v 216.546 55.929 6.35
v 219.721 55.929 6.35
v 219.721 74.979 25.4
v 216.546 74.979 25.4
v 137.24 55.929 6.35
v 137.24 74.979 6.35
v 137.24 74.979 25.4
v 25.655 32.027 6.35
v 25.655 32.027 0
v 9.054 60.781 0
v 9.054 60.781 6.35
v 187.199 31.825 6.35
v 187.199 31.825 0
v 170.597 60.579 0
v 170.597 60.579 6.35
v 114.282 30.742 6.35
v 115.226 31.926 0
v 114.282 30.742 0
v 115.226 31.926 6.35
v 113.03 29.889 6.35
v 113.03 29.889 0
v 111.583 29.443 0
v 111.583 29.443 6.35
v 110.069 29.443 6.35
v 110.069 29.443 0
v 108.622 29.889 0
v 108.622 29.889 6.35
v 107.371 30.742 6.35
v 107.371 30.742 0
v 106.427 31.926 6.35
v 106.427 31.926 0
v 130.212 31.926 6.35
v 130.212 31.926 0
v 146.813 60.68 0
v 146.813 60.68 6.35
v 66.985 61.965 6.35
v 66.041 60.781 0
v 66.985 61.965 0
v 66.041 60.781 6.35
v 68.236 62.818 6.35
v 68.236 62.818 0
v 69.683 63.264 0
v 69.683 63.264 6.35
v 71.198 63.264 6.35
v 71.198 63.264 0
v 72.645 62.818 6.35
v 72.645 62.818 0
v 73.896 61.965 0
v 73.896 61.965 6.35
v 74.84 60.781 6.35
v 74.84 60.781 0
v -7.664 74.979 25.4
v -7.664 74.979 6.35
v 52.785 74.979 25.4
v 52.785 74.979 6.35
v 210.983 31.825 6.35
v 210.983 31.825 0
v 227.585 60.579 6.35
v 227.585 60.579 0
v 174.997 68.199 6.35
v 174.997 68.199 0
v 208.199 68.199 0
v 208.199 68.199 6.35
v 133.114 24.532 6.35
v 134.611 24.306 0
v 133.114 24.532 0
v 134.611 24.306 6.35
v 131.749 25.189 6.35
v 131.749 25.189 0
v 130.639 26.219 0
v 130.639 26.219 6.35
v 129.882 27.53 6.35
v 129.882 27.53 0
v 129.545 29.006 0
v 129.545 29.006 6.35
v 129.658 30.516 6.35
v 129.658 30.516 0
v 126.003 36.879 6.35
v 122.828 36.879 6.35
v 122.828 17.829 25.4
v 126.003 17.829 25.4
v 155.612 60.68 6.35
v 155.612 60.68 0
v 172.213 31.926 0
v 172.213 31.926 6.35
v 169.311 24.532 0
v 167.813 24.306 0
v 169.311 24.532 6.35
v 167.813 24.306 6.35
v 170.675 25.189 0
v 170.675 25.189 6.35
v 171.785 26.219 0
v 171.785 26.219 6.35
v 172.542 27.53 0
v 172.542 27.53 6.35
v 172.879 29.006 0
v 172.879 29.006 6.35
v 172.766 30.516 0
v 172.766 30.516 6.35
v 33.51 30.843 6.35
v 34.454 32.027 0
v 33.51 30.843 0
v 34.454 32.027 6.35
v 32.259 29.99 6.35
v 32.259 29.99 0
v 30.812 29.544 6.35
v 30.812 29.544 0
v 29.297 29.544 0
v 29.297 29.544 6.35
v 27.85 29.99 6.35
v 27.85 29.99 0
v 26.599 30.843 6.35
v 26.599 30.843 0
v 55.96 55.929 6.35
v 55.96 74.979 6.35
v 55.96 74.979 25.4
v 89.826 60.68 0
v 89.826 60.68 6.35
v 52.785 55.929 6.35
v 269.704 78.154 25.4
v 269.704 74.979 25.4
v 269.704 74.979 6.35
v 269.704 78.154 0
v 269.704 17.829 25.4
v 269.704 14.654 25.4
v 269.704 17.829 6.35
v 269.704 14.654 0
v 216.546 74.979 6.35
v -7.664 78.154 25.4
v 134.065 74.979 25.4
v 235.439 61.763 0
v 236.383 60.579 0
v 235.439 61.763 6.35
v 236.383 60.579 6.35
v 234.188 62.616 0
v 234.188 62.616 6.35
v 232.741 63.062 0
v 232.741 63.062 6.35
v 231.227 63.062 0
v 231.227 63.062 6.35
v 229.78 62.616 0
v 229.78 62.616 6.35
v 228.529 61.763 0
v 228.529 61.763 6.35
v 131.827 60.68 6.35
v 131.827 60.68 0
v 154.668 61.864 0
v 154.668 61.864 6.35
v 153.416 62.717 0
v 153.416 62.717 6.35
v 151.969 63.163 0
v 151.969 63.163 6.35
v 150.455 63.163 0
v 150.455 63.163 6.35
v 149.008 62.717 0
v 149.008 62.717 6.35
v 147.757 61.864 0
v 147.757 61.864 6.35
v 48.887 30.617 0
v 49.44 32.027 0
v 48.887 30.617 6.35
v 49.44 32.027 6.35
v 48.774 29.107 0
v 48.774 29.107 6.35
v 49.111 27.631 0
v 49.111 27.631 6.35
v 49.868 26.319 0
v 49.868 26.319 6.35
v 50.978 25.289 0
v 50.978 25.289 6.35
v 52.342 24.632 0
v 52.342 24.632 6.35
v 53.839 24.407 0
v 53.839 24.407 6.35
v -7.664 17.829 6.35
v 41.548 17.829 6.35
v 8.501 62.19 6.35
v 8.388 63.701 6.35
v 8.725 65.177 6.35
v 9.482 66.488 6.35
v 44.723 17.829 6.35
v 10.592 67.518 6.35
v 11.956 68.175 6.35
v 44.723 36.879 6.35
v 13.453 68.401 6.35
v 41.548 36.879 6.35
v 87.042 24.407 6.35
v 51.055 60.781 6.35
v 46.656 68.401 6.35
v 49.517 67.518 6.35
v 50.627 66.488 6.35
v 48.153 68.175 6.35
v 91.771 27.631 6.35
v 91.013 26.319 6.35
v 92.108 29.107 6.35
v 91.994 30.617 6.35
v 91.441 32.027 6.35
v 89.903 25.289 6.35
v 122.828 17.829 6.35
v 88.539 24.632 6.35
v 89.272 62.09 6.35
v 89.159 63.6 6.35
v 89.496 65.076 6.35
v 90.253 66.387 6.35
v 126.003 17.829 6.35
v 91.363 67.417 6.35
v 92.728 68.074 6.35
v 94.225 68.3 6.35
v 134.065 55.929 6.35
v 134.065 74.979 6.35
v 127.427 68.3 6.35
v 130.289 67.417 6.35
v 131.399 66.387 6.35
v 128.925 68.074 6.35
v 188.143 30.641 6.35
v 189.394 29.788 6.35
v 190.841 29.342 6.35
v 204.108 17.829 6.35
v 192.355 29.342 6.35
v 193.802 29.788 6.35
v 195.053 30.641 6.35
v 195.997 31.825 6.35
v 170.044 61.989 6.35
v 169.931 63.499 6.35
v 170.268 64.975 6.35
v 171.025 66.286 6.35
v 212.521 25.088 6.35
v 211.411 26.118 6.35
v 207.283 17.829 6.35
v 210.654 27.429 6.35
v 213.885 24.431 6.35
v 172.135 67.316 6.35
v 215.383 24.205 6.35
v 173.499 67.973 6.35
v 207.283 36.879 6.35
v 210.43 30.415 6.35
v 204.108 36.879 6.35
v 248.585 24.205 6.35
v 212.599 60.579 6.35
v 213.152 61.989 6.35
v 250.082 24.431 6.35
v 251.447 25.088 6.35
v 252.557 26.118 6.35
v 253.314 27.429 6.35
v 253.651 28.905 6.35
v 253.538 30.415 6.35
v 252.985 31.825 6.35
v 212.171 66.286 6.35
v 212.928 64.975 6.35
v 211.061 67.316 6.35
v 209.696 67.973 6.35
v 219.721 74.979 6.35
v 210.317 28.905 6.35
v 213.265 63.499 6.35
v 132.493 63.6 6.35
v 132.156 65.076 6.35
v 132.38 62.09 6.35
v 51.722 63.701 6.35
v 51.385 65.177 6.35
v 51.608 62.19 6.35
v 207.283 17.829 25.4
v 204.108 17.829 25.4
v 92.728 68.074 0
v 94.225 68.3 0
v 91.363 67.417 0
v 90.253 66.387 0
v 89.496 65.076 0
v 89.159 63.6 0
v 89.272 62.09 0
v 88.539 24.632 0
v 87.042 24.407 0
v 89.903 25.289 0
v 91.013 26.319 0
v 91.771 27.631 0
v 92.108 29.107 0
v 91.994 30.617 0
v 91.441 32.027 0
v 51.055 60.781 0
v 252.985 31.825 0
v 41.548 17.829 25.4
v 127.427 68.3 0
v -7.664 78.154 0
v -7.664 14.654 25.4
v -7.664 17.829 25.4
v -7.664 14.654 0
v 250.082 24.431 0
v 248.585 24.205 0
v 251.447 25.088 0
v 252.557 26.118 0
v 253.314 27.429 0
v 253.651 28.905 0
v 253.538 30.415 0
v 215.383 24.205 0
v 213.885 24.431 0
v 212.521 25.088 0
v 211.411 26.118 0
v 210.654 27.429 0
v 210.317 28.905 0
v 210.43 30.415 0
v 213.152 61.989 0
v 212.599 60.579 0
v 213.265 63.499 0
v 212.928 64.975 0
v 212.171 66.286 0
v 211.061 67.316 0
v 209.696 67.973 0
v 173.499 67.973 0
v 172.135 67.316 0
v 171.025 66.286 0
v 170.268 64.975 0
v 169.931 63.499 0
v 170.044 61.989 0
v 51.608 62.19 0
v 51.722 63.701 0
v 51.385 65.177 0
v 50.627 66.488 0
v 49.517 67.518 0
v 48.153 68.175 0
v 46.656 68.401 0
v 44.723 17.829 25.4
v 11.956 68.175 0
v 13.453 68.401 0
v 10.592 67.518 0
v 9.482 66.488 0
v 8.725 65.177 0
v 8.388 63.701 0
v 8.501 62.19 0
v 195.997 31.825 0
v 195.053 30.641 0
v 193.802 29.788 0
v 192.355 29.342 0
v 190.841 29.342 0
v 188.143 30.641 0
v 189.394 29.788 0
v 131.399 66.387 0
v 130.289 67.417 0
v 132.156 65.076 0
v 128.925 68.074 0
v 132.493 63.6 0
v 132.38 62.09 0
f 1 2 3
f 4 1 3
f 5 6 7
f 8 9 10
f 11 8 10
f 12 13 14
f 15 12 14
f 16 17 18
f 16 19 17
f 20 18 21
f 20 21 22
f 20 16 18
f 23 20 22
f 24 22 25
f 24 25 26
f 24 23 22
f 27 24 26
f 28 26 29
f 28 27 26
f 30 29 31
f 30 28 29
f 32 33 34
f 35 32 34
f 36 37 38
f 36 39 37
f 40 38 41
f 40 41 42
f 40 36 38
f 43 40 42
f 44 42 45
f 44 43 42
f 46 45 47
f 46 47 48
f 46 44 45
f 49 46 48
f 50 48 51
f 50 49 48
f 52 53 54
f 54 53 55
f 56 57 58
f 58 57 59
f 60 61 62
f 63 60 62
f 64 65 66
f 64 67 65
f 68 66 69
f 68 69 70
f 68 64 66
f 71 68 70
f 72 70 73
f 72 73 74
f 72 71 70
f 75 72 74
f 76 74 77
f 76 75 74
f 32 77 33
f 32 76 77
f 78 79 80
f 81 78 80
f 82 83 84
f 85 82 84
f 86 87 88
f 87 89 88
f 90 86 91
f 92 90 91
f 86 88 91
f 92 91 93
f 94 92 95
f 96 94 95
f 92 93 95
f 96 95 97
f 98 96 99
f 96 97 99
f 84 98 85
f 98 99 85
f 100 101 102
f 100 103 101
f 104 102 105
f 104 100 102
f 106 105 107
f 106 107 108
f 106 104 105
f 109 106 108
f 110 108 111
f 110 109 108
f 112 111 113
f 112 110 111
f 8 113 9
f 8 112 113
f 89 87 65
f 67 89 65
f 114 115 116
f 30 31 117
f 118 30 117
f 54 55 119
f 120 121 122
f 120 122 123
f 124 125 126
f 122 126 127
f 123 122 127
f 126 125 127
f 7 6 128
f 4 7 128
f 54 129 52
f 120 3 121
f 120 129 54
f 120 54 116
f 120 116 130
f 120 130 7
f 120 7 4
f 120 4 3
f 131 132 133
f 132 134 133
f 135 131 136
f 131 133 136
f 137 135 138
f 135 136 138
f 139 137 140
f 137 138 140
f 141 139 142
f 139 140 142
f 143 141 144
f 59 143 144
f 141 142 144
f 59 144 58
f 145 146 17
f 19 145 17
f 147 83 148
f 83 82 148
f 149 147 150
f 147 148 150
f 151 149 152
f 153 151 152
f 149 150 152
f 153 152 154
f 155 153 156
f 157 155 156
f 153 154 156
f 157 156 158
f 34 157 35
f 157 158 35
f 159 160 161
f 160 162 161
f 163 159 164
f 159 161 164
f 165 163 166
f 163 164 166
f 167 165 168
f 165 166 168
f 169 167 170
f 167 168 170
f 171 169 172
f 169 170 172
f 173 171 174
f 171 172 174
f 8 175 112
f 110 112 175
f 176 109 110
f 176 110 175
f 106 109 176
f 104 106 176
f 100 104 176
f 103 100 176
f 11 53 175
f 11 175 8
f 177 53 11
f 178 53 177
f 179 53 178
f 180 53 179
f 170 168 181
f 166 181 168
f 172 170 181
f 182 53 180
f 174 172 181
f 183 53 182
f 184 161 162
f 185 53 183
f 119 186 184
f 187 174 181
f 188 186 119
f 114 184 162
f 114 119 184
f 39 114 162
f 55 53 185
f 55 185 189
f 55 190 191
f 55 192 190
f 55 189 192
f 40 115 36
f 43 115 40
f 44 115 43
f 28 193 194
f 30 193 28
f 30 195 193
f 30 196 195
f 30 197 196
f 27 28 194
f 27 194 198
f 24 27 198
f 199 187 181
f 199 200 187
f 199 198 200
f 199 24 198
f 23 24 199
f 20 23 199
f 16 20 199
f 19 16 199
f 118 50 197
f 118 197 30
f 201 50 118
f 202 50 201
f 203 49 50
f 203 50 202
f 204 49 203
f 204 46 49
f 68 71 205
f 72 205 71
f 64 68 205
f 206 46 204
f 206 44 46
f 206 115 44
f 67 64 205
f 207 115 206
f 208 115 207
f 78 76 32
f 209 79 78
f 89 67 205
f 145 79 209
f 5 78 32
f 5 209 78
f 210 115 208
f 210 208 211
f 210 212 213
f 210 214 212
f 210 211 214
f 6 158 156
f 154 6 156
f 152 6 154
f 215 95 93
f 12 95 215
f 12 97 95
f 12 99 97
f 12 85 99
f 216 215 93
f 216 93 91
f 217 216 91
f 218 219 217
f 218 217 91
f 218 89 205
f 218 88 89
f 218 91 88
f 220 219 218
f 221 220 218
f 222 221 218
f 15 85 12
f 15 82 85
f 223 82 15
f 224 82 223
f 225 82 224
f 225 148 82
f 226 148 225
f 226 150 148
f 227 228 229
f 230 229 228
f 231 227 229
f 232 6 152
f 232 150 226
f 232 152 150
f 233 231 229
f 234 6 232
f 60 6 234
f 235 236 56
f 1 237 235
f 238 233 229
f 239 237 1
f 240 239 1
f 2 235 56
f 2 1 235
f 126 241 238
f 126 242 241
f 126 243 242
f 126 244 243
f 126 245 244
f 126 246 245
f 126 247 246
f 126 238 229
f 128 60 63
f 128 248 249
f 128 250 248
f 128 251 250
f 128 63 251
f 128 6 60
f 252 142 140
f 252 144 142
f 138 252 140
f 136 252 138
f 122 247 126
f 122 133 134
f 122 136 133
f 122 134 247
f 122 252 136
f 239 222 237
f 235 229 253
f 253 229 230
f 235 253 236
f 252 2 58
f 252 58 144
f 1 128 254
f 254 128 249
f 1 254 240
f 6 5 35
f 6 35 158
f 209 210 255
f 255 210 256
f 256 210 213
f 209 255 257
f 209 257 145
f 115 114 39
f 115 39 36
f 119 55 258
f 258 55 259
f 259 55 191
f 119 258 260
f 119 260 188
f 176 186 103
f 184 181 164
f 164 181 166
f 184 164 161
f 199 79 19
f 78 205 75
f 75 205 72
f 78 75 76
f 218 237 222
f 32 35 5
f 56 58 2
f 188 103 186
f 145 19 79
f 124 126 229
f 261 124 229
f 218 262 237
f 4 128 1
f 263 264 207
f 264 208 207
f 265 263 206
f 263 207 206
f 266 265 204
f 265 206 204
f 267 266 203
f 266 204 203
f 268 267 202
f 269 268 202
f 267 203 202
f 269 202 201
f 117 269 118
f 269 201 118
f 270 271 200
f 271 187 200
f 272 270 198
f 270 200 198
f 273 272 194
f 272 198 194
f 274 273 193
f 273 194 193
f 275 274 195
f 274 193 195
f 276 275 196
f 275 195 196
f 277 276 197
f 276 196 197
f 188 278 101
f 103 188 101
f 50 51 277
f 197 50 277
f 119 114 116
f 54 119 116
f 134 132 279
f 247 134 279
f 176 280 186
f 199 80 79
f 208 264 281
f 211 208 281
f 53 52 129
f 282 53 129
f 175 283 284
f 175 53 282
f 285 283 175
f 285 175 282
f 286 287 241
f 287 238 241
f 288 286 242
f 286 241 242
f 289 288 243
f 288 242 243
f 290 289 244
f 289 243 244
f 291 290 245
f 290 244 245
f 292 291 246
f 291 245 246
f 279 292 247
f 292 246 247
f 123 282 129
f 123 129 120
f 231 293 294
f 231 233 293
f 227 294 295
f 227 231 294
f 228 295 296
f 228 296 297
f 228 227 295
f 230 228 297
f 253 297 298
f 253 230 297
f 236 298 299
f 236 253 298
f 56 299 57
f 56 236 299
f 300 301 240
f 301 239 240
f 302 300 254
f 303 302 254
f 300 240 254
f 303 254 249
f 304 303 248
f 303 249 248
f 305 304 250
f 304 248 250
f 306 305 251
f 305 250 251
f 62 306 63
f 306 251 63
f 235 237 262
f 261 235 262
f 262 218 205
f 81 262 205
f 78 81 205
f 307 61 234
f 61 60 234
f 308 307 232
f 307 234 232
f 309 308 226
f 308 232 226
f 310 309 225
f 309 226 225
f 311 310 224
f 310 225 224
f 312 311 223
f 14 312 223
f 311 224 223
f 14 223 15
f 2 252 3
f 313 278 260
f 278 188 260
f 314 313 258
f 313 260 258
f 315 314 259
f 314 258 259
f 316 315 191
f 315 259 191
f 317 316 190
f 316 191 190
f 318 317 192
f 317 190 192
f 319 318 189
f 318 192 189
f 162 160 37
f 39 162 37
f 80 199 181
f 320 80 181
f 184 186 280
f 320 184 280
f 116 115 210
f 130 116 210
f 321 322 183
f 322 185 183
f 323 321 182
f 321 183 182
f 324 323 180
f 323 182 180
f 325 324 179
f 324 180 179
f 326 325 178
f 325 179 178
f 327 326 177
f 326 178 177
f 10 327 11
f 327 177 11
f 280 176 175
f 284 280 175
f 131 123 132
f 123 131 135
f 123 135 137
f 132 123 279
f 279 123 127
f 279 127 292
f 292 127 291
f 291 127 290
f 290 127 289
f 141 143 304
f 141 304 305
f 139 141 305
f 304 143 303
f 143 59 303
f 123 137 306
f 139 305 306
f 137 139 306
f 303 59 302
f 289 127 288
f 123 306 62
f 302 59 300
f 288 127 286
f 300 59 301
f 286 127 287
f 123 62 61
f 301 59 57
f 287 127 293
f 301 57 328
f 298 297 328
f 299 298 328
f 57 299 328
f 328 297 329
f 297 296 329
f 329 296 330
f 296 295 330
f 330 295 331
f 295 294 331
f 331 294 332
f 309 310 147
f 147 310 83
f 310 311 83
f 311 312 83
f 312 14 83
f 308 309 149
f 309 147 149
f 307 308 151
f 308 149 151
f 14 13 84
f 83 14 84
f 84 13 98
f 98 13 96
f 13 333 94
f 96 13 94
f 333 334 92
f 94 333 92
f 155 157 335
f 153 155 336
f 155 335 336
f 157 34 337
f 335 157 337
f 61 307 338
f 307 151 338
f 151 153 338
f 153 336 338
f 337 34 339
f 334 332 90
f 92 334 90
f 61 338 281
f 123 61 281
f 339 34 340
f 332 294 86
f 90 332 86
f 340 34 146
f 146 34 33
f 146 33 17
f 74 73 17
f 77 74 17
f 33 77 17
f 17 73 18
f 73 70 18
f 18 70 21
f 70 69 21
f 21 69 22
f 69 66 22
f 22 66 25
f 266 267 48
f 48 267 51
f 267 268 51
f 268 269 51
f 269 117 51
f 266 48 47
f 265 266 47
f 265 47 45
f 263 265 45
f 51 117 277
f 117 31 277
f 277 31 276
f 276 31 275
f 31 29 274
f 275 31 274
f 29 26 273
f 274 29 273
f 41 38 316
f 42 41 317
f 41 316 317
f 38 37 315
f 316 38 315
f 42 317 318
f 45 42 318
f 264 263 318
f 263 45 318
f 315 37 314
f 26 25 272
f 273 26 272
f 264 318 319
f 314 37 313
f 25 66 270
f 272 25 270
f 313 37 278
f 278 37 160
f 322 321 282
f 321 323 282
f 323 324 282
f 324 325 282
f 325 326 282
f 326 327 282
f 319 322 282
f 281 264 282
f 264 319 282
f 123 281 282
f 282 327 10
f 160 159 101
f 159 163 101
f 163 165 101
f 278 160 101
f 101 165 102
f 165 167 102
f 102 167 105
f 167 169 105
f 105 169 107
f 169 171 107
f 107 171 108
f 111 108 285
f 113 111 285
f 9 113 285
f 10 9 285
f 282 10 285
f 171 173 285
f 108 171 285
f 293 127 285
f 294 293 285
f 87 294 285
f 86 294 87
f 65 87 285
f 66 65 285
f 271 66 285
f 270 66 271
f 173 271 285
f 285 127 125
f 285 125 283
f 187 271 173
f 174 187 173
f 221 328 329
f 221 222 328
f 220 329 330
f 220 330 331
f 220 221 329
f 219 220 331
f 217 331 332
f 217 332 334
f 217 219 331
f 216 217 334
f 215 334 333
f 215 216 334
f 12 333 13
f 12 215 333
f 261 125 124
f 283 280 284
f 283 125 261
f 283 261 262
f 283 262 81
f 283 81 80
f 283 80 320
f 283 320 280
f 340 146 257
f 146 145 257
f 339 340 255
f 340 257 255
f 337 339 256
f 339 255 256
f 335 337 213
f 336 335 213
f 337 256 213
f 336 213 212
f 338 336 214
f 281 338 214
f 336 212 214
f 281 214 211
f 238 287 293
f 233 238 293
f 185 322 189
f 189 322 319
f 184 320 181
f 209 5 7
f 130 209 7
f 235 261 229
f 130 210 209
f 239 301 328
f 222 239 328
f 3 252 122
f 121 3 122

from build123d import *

# Parameters (mm, degrees)
BOSS_EXTRUDE1_DEPTH      = 6.35
FILLET1_R                = 5.08
SKETCH3_W                = 277.368
SKETCH3_H                = 25.4
BOSS_EXTRUDE2_DEPTH      = 3.175
SKETCH5_W                = 277.368
SKETCH5_H                = 25.4
BOSS_EXTRUDE3_DEPTH      = 3.175
BOSS_EXTRUDE4_DEPTH      = 1.5875
BOSS_EXTRUDE4_DEPTH_BACK = 1.5875
BOSS_EXTRUDE5_DEPTH      = 1.5875
BOSS_EXTRUDE5_DEPTH_BACK = 1.5875
BOSS_EXTRUDE6_DEPTH      = 1.5875
BOSS_EXTRUDE6_DEPTH_BACK = 1.5875
BOSS_EXTRUDE7_DEPTH      = 1.5875
BOSS_EXTRUDE7_DEPTH_BACK = 1.5875
BOSS_EXTRUDE8_DEPTH      = 1.5875
BOSS_EXTRUDE8_DEPTH_BACK = 1.5875
BOSS_EXTRUDE9_DEPTH      = 1.5875
BOSS_EXTRUDE9_DEPTH_BACK = 1.5875


with BuildPart() as part:
    # Sketch2 → Boss-Extrude1 (new body)
    with BuildSketch(Plane.XY):
        with BuildLine():
            Line((-5.12438972, 14.653837172), (267.16361028, 14.653837172))
            ThreePointArc((267.16361028, 14.653837172), (268.959661504, 15.397785947), (269.70361028, 17.193837172))
            Line((269.70361028, 17.193837172), (269.70361028, 75.613837172))
            ThreePointArc((269.70361028, 75.613837172), (268.959661504, 77.409888396), (267.16361028, 78.153837172))
            Line((267.16361028, 78.153837172), (-5.12438972, 78.153837172))
            ThreePointArc((-5.12438972, 78.153837172), (-6.920440944, 77.409888396), (-7.66438972, 75.613837172))
            Line((-7.66438972, 75.613837172), (-7.66438972, 17.193837172))
            ThreePointArc((-7.66438972, 17.193837172), (-6.920440944, 15.397785947), (-5.12438972, 14.653837172))
        make_face()
        Polygon((30.05461028, 24.406794359), (4.65461028, 68.400884872), (55.45461028, 68.400884872), align=None, mode=Mode.SUBTRACT)
        Polygon((70.44061028, 68.400882428), (95.84061028, 24.406791915), (45.04061028, 24.406791915), align=None, mode=Mode.SUBTRACT)
        Polygon((110.82627023, 24.305837172), (85.42627023, 68.299927684), (136.22627023, 68.299927684), align=None, mode=Mode.SUBTRACT)
        Polygon((125.81227023, 24.305834728), (151.21227023, 68.29992524), (176.61227023, 24.305834728), align=None, mode=Mode.SUBTRACT)
        Polygon((191.59793018, 24.204879984), (166.19793018, 68.198970496), (216.99793018, 68.198970496), align=None, mode=Mode.SUBTRACT)
        Polygon((206.58393018, 24.20487754), (231.98393018, 68.198968052), (257.38393018, 24.20487754), align=None, mode=Mode.SUBTRACT)
    extrude(amount=BOSS_EXTRUDE1_DEPTH)

    # Fillet1
    fillet1_edges = [part.edges().sort_by_distance(p)[0] for p in [
        (257.38393018, 24.20487754, 3.175),
        (231.98393018, 68.198968052, 3.175),
        (206.58393018, 24.20487754, 3.175),
        (176.61227023, 24.305834728, 3.175),
        (151.21227023, 68.29992524, 3.175),
        (125.81227023, 24.305834728, 3.175),
        (4.65461028, 68.400884872, 3.175),
        (30.05461028, 24.406794359, 3.175),
        (55.45461028, 68.400884872, 3.175),
        (95.84061028, 24.406791915, 3.175),
        (70.44061028, 68.400882428, 3.175),
        (45.04061028, 24.406791915, 3.175),
        (85.42627023, 68.299927684, 3.175),
        (110.82627023, 24.305837172, 3.175),
        (136.22627023, 68.299927684, 3.175),
        (166.19793018, 68.198970496, 3.175),
        (191.59793018, 24.204879984, 3.175),
        (216.99793018, 68.198970496, 3.175),
    ]]
    fillet(fillet1_edges, radius=FILLET1_R)

    # Sketch3 → Boss-Extrude2 (add)
    with BuildSketch(Plane(origin=(0, 78.153837172, 0), x_dir=(1, 0, 0), z_dir=(0, 1, 0))):
        with Locations((131.01961028, -12.7)):
            Rectangle(SKETCH3_W, SKETCH3_H)
    extrude(amount=-BOSS_EXTRUDE2_DEPTH)

    # Sketch5 → Boss-Extrude3 (add)
    with BuildSketch(Plane(origin=(0, 14.653837172, 0), x_dir=(-1, 0, 0), z_dir=(0, -1, 0))):
        with Locations((-131.01961028, -12.7)):
            Rectangle(SKETCH5_W, SKETCH5_H)
    extrude(amount=-BOSS_EXTRUDE3_DEPTH)

    # Sketch8 → Boss-Extrude4 (add, two sides: drawn at the far end of the back side and taken through both)
    with BuildSketch(Plane(origin=(43.13561028, 0, 0), x_dir=(0, 0, -1), z_dir=(1, 0, 0)).offset(-BOSS_EXTRUDE4_DEPTH_BACK)):
        Polygon((-25.4, 17.828837172), (-6.35, 17.828837172), (-6.35, 36.878837172), align=None)
    extrude(amount=BOSS_EXTRUDE4_DEPTH + BOSS_EXTRUDE4_DEPTH_BACK)

    # Sketch9 → Boss-Extrude5 (add, two sides: drawn at the far end of the back side and taken through both)
    with BuildSketch(Plane(origin=(124.41561028, 0, 0), x_dir=(0, 0, -1), z_dir=(1, 0, 0)).offset(-BOSS_EXTRUDE5_DEPTH_BACK)):
        Polygon((-25.4, 17.828837172), (-6.35, 17.828837172), (-6.35, 36.878837172), align=None)
    extrude(amount=BOSS_EXTRUDE5_DEPTH + BOSS_EXTRUDE5_DEPTH_BACK)

    # Sketch10 → Boss-Extrude6 (add, two sides: drawn at the far end of the back side and taken through both)
    with BuildSketch(Plane(origin=(205.69561028, 0, 0), x_dir=(0, 0, -1), z_dir=(1, 0, 0)).offset(-BOSS_EXTRUDE6_DEPTH_BACK)):
        Polygon((-25.4, 17.828837172), (-6.35, 17.828837172), (-6.35, 36.878837172), align=None)
    extrude(amount=BOSS_EXTRUDE6_DEPTH + BOSS_EXTRUDE6_DEPTH_BACK)

    # Sketch11 → Boss-Extrude7 (add, two sides: drawn at the far end of the back side and taken through both)
    with BuildSketch(Plane.ZY.offset(-218.133612998).offset(-BOSS_EXTRUDE7_DEPTH_BACK)):
        Polygon((25.4, 74.978837172), (6.35, 74.978837172), (6.35, 55.928837172), align=None)
    extrude(amount=BOSS_EXTRUDE7_DEPTH + BOSS_EXTRUDE7_DEPTH_BACK)

    # Sketch12 → Boss-Extrude8 (add, two sides: drawn at the far end of the back side and taken through both)
    with BuildSketch(Plane.ZY.offset(-135.652884913).offset(-BOSS_EXTRUDE8_DEPTH_BACK)):
        Polygon((25.4, 74.978837172), (6.35, 74.978837172), (6.35, 55.928837172), align=None)
    extrude(amount=BOSS_EXTRUDE8_DEPTH + BOSS_EXTRUDE8_DEPTH_BACK)

    # Sketch13 → Boss-Extrude9 (add, two sides: drawn at the far end of the back side and taken through both)
    with BuildSketch(Plane.ZY.offset(-54.372884913).offset(-BOSS_EXTRUDE9_DEPTH_BACK)):
        Polygon((25.4, 74.978837172), (6.35, 74.978837172), (6.35, 55.928837172), align=None)
    extrude(amount=BOSS_EXTRUDE9_DEPTH + BOSS_EXTRUDE9_DEPTH_BACK)


solid = part.part
